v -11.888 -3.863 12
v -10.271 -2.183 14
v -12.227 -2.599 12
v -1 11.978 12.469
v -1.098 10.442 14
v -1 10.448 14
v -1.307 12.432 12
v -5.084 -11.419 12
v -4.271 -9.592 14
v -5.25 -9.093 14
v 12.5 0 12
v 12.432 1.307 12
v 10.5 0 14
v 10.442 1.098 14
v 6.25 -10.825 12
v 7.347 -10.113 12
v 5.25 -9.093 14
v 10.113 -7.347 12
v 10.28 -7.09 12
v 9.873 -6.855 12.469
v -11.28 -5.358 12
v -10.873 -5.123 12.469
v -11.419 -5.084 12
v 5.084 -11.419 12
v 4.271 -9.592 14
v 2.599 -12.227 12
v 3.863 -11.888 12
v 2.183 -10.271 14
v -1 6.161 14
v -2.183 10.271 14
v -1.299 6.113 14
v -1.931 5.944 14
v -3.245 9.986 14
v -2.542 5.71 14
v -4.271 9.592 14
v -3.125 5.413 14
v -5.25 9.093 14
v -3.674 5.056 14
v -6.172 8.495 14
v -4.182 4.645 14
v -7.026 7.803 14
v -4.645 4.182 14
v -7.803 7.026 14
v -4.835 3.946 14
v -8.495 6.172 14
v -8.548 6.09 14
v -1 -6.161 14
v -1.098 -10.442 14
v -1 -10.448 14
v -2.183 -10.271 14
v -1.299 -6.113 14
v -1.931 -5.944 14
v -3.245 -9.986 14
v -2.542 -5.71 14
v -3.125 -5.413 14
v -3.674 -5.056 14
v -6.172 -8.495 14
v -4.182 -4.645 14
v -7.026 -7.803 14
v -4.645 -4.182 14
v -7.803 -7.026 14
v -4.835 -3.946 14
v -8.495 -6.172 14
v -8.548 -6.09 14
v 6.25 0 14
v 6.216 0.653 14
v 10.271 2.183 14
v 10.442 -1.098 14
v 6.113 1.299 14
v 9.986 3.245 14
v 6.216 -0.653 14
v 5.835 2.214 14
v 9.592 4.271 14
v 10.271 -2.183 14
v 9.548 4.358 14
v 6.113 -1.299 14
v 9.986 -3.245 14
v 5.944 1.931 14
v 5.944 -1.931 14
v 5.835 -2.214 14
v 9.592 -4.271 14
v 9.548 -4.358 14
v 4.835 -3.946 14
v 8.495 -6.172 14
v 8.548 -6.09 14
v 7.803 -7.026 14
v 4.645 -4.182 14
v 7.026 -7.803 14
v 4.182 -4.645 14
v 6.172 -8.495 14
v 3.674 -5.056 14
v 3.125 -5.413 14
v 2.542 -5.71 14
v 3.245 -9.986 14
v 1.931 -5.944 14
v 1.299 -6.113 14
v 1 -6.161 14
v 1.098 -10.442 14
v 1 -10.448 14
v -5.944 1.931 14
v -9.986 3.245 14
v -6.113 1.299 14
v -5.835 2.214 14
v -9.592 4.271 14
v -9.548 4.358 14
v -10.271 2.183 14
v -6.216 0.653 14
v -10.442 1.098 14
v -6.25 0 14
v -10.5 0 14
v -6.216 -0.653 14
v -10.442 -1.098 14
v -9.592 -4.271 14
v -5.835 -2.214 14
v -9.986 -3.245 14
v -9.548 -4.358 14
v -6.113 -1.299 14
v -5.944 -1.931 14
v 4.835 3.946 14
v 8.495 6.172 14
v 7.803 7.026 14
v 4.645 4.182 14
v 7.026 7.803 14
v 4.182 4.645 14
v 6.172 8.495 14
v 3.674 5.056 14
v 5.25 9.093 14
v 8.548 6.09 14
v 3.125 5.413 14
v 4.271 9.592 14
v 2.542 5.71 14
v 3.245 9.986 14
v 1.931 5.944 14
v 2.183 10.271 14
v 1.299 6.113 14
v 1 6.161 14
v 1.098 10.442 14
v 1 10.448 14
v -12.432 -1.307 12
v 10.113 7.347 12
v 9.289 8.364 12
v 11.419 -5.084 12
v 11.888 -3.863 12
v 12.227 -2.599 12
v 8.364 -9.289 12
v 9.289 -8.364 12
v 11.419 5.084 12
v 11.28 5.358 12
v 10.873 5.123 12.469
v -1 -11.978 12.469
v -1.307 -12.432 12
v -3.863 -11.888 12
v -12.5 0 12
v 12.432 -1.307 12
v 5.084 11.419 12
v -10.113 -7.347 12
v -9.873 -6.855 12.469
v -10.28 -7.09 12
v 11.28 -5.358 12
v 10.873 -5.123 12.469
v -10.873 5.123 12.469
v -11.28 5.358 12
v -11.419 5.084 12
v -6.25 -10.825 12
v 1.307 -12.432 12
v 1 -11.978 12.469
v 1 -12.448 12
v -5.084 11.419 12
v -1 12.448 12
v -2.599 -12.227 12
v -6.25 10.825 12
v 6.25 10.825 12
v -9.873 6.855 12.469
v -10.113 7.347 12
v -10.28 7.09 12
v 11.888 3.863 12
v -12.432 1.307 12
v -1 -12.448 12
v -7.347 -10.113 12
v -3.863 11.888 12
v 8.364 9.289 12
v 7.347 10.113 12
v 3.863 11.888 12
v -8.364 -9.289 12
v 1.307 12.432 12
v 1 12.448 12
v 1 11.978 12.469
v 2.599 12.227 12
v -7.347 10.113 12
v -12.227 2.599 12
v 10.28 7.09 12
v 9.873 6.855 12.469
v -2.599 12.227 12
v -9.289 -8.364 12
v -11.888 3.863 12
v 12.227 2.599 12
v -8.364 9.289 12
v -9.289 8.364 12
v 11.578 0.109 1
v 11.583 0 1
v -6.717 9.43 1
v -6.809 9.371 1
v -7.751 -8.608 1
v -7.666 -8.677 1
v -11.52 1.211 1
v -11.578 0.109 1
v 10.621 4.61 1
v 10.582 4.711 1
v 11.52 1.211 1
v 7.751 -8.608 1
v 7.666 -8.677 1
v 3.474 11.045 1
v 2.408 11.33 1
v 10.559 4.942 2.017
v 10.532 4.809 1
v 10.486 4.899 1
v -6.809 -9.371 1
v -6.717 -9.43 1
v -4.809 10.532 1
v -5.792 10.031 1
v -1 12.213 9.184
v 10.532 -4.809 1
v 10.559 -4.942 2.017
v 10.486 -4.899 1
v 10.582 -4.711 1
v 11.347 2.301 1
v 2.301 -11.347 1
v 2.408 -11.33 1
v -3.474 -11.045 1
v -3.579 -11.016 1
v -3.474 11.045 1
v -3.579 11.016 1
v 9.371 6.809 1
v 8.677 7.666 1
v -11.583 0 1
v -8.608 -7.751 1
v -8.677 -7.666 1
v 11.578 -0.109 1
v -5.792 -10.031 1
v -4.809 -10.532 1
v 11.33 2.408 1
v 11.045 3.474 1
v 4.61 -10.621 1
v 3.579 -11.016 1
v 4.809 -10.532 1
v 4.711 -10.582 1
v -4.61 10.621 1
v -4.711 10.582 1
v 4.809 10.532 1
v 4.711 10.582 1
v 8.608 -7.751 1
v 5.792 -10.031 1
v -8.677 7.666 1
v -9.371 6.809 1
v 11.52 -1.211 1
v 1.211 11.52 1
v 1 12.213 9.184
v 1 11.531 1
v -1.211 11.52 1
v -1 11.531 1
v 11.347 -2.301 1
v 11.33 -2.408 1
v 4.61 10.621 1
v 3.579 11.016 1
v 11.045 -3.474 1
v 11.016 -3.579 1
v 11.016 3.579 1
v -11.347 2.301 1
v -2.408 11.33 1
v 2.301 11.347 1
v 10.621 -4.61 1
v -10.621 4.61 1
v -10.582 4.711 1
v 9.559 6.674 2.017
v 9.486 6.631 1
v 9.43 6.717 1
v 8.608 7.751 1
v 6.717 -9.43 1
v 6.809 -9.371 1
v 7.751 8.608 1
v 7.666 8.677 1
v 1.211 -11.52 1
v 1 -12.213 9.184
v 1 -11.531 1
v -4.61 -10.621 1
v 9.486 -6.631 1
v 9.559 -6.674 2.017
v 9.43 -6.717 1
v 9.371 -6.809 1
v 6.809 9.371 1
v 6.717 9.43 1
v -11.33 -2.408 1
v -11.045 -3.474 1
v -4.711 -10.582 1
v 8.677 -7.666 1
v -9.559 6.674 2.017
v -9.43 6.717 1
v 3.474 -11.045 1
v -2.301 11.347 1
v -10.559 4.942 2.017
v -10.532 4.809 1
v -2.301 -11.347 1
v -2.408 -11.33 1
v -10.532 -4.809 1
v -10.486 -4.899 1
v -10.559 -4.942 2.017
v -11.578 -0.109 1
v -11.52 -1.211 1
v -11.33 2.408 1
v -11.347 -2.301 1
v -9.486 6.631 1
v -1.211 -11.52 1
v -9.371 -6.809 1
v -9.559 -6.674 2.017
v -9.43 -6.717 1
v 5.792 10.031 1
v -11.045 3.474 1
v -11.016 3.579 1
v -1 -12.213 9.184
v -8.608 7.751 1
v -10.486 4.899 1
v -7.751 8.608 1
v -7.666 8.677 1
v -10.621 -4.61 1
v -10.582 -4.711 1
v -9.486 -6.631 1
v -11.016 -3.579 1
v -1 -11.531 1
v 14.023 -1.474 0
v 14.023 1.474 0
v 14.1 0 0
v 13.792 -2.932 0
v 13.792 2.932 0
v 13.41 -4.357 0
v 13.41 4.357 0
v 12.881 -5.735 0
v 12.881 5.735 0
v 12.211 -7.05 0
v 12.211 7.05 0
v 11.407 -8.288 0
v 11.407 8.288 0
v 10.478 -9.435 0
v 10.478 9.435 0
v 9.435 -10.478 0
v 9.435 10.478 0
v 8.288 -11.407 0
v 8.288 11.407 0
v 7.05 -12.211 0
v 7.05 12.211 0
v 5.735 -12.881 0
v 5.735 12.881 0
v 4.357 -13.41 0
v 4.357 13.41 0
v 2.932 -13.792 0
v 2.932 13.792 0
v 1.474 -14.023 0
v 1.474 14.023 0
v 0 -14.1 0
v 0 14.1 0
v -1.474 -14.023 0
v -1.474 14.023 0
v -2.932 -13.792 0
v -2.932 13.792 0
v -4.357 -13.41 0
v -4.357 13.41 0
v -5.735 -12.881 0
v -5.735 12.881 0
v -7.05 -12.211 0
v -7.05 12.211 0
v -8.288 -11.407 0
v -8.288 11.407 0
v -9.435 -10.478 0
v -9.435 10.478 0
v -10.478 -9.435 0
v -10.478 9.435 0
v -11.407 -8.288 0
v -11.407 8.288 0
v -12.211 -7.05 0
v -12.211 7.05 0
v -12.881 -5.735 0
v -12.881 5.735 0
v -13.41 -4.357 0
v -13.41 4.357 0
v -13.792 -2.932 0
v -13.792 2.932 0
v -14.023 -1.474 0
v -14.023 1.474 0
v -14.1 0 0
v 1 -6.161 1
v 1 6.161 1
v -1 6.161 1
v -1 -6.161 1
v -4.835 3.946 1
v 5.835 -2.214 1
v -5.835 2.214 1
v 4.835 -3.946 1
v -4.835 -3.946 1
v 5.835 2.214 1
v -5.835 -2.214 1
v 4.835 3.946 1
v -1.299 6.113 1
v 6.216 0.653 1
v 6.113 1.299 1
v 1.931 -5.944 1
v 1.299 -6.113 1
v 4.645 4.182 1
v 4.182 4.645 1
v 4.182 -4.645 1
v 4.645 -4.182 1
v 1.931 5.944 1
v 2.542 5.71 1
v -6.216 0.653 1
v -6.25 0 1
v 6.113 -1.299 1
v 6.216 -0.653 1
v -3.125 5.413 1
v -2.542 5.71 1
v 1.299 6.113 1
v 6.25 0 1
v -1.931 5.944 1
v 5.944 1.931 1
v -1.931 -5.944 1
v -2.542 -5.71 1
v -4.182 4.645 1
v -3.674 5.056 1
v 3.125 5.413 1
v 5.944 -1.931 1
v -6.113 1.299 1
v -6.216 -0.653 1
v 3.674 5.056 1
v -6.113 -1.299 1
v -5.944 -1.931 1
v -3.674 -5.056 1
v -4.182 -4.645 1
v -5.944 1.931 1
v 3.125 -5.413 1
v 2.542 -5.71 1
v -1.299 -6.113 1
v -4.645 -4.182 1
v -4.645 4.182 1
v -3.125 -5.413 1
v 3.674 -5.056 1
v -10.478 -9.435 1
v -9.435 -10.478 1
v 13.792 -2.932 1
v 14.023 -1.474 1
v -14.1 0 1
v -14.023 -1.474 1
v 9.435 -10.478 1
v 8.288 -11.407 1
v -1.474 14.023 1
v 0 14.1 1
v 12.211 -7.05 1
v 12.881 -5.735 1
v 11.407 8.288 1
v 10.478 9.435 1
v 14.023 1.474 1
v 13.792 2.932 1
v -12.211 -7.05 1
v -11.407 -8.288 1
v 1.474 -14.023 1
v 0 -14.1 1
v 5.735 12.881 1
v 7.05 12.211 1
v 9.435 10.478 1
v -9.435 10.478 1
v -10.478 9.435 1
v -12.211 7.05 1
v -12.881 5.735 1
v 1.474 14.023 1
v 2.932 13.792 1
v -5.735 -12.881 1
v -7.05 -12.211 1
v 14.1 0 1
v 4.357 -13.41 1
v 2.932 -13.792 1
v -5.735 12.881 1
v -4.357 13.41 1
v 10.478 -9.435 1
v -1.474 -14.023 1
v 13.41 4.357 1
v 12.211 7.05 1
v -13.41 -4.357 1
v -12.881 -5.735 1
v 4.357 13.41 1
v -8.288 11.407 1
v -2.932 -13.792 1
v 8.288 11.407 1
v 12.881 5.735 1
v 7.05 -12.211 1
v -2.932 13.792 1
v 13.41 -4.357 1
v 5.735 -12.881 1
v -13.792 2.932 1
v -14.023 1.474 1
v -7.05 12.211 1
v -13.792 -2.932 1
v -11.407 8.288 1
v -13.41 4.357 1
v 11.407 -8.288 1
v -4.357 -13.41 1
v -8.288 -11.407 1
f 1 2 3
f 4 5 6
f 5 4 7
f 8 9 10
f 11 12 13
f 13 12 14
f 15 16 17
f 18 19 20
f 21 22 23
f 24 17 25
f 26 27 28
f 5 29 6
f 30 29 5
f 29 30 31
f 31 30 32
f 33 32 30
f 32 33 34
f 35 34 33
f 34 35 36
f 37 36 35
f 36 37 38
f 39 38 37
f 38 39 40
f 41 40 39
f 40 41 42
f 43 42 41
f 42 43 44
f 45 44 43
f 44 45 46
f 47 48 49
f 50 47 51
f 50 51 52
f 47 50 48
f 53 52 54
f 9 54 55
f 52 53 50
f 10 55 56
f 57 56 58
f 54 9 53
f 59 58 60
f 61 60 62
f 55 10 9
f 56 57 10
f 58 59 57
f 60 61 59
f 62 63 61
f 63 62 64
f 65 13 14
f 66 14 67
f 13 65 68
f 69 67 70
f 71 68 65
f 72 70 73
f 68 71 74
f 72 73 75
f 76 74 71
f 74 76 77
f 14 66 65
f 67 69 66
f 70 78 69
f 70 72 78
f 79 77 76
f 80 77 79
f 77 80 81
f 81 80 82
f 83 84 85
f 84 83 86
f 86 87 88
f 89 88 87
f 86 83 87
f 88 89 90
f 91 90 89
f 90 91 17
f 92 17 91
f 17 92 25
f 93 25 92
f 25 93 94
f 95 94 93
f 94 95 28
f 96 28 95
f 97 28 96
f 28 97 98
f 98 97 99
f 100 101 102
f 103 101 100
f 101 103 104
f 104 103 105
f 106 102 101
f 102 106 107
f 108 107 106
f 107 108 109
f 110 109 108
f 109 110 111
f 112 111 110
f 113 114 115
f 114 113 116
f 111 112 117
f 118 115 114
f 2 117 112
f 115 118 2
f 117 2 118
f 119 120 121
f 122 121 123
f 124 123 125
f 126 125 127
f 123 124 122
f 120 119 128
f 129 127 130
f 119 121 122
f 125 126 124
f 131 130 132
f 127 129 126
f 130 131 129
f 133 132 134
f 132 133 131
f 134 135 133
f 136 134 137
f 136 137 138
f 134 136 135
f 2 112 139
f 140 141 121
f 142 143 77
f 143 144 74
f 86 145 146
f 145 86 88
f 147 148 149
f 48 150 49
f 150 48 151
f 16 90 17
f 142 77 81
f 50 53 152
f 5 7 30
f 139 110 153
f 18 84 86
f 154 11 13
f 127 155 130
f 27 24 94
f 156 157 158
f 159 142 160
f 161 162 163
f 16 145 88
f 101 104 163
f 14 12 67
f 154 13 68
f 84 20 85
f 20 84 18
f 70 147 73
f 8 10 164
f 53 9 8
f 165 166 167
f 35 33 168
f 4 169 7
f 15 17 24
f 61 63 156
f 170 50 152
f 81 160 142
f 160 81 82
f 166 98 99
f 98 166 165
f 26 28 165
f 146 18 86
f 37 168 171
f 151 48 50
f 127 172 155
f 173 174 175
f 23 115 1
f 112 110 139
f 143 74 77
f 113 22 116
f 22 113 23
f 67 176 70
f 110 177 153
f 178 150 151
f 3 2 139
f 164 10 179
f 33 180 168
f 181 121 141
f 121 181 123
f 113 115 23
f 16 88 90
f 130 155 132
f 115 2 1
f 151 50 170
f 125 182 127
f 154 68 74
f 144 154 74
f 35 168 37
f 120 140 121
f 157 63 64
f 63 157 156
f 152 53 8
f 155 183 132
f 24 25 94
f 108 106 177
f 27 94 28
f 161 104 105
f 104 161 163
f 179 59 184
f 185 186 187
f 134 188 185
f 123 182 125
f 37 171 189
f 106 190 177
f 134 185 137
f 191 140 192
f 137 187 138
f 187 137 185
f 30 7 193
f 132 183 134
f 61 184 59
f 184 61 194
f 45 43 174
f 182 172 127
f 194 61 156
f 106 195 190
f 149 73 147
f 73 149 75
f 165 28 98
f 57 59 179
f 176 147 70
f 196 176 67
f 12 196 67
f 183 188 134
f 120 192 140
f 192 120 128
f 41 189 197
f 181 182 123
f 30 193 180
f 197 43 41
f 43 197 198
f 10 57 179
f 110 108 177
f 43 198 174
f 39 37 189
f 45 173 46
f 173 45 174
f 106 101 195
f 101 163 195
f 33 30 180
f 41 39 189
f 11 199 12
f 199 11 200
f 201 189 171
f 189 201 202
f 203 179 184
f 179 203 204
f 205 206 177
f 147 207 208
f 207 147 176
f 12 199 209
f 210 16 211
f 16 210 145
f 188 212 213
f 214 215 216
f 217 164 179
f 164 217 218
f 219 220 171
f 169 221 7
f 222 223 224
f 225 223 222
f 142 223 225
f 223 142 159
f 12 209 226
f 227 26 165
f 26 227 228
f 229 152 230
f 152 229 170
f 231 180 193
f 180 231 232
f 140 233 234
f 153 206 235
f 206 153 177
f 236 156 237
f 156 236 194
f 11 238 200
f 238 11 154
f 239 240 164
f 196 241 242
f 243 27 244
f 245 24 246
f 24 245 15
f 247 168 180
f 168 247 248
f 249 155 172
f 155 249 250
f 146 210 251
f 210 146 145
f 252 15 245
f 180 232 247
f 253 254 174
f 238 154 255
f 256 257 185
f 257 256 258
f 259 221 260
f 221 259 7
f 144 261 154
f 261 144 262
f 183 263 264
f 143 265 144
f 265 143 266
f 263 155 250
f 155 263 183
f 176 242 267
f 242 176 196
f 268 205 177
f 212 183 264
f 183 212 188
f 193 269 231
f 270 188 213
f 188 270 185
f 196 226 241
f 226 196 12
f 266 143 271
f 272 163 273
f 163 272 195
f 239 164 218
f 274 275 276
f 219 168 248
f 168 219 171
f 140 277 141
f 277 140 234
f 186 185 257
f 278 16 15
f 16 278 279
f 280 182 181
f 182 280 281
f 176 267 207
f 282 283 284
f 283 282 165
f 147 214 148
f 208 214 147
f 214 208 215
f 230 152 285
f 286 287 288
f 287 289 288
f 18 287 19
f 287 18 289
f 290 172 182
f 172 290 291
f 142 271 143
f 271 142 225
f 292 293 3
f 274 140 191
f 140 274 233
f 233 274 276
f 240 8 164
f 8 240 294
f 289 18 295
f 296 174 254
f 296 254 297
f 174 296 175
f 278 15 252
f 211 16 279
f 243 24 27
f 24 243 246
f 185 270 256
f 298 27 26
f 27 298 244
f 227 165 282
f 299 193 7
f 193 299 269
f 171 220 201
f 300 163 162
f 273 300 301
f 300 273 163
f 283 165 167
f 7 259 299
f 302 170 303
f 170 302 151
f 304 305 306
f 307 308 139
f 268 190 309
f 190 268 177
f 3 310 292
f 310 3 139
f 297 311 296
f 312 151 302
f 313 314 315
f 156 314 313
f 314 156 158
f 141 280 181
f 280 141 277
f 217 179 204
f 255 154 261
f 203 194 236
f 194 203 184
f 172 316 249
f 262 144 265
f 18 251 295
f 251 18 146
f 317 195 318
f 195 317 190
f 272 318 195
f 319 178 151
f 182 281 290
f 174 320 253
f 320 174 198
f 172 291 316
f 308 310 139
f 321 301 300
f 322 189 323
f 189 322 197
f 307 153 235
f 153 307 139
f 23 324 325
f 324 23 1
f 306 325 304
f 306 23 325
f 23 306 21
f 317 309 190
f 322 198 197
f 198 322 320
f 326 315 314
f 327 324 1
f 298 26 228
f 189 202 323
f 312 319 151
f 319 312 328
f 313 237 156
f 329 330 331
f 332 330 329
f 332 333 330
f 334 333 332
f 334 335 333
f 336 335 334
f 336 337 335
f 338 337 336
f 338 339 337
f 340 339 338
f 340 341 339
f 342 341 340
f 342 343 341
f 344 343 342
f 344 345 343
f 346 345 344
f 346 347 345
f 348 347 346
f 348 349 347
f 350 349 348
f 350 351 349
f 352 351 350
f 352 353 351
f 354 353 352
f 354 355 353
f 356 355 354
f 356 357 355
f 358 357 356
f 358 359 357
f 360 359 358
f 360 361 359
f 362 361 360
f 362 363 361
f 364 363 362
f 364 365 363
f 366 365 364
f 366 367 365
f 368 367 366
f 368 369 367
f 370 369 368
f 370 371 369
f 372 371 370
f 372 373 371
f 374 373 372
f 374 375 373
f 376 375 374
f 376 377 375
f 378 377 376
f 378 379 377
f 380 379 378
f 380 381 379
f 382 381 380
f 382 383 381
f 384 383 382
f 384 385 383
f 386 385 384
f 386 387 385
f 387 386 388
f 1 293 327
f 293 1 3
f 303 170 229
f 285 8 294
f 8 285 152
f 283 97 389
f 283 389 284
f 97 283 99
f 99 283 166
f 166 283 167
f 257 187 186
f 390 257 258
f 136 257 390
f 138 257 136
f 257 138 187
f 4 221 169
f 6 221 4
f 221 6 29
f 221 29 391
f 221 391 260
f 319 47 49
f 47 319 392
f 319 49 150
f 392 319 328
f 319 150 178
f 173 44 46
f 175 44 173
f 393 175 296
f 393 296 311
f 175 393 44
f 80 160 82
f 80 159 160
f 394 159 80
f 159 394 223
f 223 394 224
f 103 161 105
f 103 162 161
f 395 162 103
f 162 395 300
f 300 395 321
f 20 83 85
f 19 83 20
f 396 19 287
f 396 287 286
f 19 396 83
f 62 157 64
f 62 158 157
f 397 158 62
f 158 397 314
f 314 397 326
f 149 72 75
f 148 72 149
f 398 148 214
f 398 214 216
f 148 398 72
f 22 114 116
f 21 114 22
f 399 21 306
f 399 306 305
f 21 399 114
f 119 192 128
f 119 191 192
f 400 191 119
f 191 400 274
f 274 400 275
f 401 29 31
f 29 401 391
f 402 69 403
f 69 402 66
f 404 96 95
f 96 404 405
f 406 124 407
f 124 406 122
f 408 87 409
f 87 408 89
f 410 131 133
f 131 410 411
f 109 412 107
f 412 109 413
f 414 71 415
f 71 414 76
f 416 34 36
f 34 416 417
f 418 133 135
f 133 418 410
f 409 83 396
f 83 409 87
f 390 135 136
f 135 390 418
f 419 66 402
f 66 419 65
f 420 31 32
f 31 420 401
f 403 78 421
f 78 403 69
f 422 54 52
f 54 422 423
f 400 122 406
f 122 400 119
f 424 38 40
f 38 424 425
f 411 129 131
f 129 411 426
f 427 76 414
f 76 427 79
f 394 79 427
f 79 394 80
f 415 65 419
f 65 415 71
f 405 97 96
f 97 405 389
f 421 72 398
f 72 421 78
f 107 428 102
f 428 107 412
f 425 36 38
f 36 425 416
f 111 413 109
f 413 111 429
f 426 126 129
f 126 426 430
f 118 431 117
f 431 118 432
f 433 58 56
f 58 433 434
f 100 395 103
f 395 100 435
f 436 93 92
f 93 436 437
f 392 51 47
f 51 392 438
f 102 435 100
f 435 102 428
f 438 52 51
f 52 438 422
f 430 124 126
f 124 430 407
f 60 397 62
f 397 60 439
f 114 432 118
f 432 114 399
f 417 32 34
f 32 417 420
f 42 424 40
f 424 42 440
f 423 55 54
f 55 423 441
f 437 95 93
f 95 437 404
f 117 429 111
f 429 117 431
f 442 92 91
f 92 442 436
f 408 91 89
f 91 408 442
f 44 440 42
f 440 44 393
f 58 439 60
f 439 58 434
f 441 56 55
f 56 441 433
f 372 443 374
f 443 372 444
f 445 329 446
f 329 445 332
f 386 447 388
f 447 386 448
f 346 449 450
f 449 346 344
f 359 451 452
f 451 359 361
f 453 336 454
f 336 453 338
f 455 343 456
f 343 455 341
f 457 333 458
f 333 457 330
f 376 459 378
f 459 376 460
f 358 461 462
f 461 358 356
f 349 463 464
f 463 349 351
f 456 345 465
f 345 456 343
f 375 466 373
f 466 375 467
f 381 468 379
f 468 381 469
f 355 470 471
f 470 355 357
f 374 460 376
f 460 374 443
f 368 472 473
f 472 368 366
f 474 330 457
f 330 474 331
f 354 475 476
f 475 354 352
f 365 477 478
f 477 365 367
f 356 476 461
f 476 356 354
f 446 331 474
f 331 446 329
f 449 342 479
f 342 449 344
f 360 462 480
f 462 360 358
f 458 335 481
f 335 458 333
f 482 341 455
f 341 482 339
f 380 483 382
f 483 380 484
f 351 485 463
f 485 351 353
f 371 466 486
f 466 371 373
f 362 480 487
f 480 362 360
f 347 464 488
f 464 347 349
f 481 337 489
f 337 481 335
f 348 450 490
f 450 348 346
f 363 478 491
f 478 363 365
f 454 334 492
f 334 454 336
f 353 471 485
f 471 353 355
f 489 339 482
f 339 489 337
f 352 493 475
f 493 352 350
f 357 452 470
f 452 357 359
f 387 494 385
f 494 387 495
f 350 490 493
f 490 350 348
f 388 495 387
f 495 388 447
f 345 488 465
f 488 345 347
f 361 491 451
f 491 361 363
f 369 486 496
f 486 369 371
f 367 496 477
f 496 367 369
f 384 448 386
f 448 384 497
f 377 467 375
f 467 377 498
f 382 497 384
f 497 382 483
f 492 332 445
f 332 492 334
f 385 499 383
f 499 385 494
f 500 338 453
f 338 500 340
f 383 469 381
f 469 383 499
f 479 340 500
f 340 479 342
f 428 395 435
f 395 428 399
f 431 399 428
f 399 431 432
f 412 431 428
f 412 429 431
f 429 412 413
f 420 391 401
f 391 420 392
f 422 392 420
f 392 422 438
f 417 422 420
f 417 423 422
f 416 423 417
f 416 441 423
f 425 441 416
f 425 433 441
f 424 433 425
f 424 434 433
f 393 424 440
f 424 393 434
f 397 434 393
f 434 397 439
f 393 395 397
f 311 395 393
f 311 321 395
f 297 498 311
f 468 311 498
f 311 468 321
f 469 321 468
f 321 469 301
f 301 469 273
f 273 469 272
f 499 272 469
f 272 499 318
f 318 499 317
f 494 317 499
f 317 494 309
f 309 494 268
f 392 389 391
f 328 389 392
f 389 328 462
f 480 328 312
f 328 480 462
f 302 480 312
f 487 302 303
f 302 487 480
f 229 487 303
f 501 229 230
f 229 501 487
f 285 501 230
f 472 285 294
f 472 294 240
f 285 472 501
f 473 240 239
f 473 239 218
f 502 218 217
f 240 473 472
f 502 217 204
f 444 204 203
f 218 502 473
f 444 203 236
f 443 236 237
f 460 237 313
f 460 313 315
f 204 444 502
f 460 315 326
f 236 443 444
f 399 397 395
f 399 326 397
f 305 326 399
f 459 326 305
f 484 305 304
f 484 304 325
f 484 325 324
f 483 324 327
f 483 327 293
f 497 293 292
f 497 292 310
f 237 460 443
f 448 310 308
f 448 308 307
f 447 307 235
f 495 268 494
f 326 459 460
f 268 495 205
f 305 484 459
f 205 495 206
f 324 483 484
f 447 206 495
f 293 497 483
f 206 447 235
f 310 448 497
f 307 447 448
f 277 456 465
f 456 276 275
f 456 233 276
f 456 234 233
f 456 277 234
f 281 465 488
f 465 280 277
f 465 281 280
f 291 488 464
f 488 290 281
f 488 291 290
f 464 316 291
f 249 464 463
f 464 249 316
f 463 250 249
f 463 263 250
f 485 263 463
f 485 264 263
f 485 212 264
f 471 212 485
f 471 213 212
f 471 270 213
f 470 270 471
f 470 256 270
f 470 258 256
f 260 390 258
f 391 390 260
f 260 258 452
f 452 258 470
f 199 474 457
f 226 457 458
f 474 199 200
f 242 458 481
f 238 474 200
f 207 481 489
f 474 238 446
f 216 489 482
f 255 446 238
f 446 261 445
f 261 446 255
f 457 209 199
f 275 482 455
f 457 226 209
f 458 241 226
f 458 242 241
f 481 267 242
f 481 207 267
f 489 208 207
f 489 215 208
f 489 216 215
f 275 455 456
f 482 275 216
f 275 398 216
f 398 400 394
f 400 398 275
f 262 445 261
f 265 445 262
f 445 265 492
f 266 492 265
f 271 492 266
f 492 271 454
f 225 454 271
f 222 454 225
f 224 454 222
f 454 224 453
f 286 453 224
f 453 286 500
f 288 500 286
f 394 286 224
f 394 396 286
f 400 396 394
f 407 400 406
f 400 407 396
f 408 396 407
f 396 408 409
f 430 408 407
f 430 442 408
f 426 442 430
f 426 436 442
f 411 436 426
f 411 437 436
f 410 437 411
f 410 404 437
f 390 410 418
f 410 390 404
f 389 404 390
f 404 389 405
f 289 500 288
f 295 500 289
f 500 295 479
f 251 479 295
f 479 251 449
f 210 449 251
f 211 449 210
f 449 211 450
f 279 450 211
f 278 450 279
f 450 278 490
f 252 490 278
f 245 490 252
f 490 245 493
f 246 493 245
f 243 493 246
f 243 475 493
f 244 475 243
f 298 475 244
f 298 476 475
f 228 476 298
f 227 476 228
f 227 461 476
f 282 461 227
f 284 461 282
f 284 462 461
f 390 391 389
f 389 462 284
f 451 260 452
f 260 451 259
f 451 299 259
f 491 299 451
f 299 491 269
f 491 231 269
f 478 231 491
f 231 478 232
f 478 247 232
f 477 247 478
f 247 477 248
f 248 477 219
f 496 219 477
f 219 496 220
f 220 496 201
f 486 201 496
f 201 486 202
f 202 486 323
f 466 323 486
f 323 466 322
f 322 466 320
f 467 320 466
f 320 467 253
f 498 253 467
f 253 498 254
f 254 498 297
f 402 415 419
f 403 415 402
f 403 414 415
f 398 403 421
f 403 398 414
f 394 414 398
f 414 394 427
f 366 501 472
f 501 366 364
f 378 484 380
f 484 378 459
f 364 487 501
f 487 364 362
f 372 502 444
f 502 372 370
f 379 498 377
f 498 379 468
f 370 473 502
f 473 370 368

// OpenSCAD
// =============================================
// OpenSCAD: Handlebar stub (заглушка руля)
// Версия: v1.0 — первичная параметрическая модель
// =============================================

use <../modules.scad>;

// Короткое описание
description = "Dome cap with flexible petals for handlebar tube";
version_str = "1.0";

// ===== Точность аппроксимации окружностей =====
$fn = 0;        // фиксированную сегментацию отключаем
$fa = 6;        // 5–8° обычно достаточно
$fs = 0.35;     // ≈ диаметр сопла (0.3–0.5 для сопла 0.4)
pin_fs = 0.25;  // чуть тоньше для штырей и отверстий

// ===== Режим печати тест‑фрагментов =====
test_fragment = false;   // true — печатать только угловые фрагменты (base+frame)
frag_size     = 20;      // размер квадрата вырезки, мм
frag_index    = 0;       // 0=НЛ, 1=ВЛ, 2=НП, 3=ВП (относительно основания)
frag_gap_x    = 10;      // зазор между фрагментами по X, мм
frag_h_extra  = 20;      // запас по высоте клипа, мм

// ===== Общие доп. параметры =====
tiny = 0.1;                  // небольшой зазор для булевых операций
edge_chamfer_z = 1;          // высота фаски по Z (мм)
edge_chamfer_x = 5;          // вылет фаски по X (мм)
edge_chamfer_y = 5;          // вылет фаски по Y (мм)
screen_frame_gap = 0.2;      // только для высоты вычитаний

// =============================================
// ===== Параметры модели =====
// Основная геометрия по фото/описанию пользователя
// 1) Верхняя шапка (сферический сегмент)
cap_d_outer   = 28.2;   // внешний диаметр шапки, мм
cap_h         = 0.1; //4.2;    // высота шапки над плоскостью, мм
cap_shell_th  = 1.0;    // толщина оболочки купола, мм

// 2) Вставка с лепестками (конус + прорези)
insert_d_bottom = 25;   // диаметр у основания (вход в трубу), мм
insert_d_top    = 23;   // диаметр у верхней кромки, мм
insert_h        = 14.0;   // общая высота вставки, мм
petal_ch        = 2.0;    // высота нижней фаски лепестков, мм
petals_n        = 6;      // количество лепестков
slot_w_mm       = 2.0;    // ширина прорези между лепестками, мм

// Вычисляемые служебные
cap_r_outer = cap_d_outer/2;
cap_R_sphere = (cap_r_outer*cap_r_outer + cap_h*cap_h) / (2*cap_h); // радиус сферы для сегмента
cap_r_inner = max(cap_r_outer - cap_shell_th, 0.5);
cap_R_inner = max(cap_R_sphere - cap_shell_th, 0.5);

// Габариты для клипа фрагментов
base_L = cap_d_outer;
base_W = cap_d_outer;
base_h = cap_h + insert_h;

// =============================================
// ===== Комментарии ===========================
/*
Детали/фрагменты:
- cap_top: сферическая шапка толщиной cap_shell_th
- cap_plate: круглая пластина под шапкой толщиной cap_plate_th, d = cap_plate_d
- petals_ring: конусная втулка с прорезями (лепестки), снизу фаска petal_ch
- base: сборка cap + petals_ring

Ориентация: Z вверх, плоскость сопряжения (верхним дном втулки) — Z=0.
Шапка располагается выше Z=0, лепестки — ниже.
*/

// =============================================
// ===== Вспомогательные модули =================
module spherical_cap_segment(d_outer, h){
  // Создаёт внешний сферический сегмент высоты h и диаметра d_outer, основание в плоскости Z=0
  r_out = d_outer/2;
  R = (r_out*r_out + h*h) / (2*h);
  // Ограничиваем сферу двумя плоскостями: z in [0, h]
  // translate([0,0,R - 1.1]) sphere(r=R, $fs=$fs, $fa=$fa);
  translate([0,0,-h]) intersection(){
    translate([0,0,R - 0]) sphere(r=R, $fs=$fs, $fa=$fa/3);
    cylinder(h=h, d=d_outer + 2*tiny);
  }
  translate([0,0,0]) cylinder(h=cap_shell_th, d=d_outer);
}

// Вырез для прорезей (тангенциальный прямоугольный нож)
module petal_slot_cutter(h, w, d_ref){
  R = d_ref/2 + 1; // +1 чтобы гарантированно пересечь наружу
  translate([-w/2, -R, 0]) cube([w, 2*R, h + 2*tiny]);
}

// =============================================
// ===== Модули деталей ========================

// 1) Купол
module cap_top(){
  difference(){
    spherical_cap_segment(cap_d_outer, cap_h);
    // внутренняя полость купола (приближённо тем же центром сферы)
    // translate([0,0,0])
    //   intersection(){
    //     translate([0,0,cap_R_inner - cap_h]) sphere(r=cap_R_inner, $fs=$fs, $fa=$fa);
    //     cylinder(h=cap_h + tiny, d=max(cap_d_outer - 2*cap_shell_th, tiny));
    //   }
  }
}

// 2) Круглая пластина соединения купола с втулкой
module cap(){
  // Только сферический сегмент толщины cap_shell_th без нижней пластины
  cap_top();
}

// 3) Втулка с лепестками (осевая заготовка + прорези)
module petals_body_up(){
  // Модель от Z=0 вверх; затем развернём вниз через upside_down(insert_h)
  union(){
    // нижний участок — фаска наружу (сужение к низу)
    cylinder(h=petal_ch, d1=max(insert_d_bottom - 2*petal_ch, tiny), d2=insert_d_bottom, $fs=pin_fs, $fa=6);
    // основной конусный участок
    translate([0,0,petal_ch])
      cylinder(h=max(insert_h - petal_ch, tiny), d1=insert_d_bottom, d2=insert_d_top, $fs=pin_fs, $fa=6);
  }
}

module petals_ring(){
  // Разворачиваем тело вниз: верх втулки совпадает с Z=0
  upside_down(insert_h)
    difference(){
      petals_body_up();
      // прорези
      for(i=[0:petals_n-1])
        rotate([0,0,i*360/petals_n])
          petal_slot_cutter(insert_h + tiny, slot_w_mm, max(insert_d_bottom, insert_d_top) + 4);
      // внутренняя полость втулки
      translate([0,0,0])
        cylinder(h=insert_h + tiny, d=max(insert_d_bottom /2, tiny), $fs=pin_fs, $fa=6);
    }
}

// 4) Сборка
module base(){
  union(){
    cap();
    petals_ring();
  }
}

// ===== Вывод всех фрагментов ====================
module show_all(){
  // Можно отключать элементы при необходимости
  base();
}

// ===== Обрезка тест‑фрагментов ==================
module show_all_clipped(){
  clip_for_fragments_bbox(base_L, base_W, base_h, enabled=test_fragment, frag_size=frag_size, frag_index=frag_index, frag_h_extra=frag_h_extra)
    show_all();
}

// ===== Точка входа ==============================
module main(){
  show_all_clipped();
}

main();
